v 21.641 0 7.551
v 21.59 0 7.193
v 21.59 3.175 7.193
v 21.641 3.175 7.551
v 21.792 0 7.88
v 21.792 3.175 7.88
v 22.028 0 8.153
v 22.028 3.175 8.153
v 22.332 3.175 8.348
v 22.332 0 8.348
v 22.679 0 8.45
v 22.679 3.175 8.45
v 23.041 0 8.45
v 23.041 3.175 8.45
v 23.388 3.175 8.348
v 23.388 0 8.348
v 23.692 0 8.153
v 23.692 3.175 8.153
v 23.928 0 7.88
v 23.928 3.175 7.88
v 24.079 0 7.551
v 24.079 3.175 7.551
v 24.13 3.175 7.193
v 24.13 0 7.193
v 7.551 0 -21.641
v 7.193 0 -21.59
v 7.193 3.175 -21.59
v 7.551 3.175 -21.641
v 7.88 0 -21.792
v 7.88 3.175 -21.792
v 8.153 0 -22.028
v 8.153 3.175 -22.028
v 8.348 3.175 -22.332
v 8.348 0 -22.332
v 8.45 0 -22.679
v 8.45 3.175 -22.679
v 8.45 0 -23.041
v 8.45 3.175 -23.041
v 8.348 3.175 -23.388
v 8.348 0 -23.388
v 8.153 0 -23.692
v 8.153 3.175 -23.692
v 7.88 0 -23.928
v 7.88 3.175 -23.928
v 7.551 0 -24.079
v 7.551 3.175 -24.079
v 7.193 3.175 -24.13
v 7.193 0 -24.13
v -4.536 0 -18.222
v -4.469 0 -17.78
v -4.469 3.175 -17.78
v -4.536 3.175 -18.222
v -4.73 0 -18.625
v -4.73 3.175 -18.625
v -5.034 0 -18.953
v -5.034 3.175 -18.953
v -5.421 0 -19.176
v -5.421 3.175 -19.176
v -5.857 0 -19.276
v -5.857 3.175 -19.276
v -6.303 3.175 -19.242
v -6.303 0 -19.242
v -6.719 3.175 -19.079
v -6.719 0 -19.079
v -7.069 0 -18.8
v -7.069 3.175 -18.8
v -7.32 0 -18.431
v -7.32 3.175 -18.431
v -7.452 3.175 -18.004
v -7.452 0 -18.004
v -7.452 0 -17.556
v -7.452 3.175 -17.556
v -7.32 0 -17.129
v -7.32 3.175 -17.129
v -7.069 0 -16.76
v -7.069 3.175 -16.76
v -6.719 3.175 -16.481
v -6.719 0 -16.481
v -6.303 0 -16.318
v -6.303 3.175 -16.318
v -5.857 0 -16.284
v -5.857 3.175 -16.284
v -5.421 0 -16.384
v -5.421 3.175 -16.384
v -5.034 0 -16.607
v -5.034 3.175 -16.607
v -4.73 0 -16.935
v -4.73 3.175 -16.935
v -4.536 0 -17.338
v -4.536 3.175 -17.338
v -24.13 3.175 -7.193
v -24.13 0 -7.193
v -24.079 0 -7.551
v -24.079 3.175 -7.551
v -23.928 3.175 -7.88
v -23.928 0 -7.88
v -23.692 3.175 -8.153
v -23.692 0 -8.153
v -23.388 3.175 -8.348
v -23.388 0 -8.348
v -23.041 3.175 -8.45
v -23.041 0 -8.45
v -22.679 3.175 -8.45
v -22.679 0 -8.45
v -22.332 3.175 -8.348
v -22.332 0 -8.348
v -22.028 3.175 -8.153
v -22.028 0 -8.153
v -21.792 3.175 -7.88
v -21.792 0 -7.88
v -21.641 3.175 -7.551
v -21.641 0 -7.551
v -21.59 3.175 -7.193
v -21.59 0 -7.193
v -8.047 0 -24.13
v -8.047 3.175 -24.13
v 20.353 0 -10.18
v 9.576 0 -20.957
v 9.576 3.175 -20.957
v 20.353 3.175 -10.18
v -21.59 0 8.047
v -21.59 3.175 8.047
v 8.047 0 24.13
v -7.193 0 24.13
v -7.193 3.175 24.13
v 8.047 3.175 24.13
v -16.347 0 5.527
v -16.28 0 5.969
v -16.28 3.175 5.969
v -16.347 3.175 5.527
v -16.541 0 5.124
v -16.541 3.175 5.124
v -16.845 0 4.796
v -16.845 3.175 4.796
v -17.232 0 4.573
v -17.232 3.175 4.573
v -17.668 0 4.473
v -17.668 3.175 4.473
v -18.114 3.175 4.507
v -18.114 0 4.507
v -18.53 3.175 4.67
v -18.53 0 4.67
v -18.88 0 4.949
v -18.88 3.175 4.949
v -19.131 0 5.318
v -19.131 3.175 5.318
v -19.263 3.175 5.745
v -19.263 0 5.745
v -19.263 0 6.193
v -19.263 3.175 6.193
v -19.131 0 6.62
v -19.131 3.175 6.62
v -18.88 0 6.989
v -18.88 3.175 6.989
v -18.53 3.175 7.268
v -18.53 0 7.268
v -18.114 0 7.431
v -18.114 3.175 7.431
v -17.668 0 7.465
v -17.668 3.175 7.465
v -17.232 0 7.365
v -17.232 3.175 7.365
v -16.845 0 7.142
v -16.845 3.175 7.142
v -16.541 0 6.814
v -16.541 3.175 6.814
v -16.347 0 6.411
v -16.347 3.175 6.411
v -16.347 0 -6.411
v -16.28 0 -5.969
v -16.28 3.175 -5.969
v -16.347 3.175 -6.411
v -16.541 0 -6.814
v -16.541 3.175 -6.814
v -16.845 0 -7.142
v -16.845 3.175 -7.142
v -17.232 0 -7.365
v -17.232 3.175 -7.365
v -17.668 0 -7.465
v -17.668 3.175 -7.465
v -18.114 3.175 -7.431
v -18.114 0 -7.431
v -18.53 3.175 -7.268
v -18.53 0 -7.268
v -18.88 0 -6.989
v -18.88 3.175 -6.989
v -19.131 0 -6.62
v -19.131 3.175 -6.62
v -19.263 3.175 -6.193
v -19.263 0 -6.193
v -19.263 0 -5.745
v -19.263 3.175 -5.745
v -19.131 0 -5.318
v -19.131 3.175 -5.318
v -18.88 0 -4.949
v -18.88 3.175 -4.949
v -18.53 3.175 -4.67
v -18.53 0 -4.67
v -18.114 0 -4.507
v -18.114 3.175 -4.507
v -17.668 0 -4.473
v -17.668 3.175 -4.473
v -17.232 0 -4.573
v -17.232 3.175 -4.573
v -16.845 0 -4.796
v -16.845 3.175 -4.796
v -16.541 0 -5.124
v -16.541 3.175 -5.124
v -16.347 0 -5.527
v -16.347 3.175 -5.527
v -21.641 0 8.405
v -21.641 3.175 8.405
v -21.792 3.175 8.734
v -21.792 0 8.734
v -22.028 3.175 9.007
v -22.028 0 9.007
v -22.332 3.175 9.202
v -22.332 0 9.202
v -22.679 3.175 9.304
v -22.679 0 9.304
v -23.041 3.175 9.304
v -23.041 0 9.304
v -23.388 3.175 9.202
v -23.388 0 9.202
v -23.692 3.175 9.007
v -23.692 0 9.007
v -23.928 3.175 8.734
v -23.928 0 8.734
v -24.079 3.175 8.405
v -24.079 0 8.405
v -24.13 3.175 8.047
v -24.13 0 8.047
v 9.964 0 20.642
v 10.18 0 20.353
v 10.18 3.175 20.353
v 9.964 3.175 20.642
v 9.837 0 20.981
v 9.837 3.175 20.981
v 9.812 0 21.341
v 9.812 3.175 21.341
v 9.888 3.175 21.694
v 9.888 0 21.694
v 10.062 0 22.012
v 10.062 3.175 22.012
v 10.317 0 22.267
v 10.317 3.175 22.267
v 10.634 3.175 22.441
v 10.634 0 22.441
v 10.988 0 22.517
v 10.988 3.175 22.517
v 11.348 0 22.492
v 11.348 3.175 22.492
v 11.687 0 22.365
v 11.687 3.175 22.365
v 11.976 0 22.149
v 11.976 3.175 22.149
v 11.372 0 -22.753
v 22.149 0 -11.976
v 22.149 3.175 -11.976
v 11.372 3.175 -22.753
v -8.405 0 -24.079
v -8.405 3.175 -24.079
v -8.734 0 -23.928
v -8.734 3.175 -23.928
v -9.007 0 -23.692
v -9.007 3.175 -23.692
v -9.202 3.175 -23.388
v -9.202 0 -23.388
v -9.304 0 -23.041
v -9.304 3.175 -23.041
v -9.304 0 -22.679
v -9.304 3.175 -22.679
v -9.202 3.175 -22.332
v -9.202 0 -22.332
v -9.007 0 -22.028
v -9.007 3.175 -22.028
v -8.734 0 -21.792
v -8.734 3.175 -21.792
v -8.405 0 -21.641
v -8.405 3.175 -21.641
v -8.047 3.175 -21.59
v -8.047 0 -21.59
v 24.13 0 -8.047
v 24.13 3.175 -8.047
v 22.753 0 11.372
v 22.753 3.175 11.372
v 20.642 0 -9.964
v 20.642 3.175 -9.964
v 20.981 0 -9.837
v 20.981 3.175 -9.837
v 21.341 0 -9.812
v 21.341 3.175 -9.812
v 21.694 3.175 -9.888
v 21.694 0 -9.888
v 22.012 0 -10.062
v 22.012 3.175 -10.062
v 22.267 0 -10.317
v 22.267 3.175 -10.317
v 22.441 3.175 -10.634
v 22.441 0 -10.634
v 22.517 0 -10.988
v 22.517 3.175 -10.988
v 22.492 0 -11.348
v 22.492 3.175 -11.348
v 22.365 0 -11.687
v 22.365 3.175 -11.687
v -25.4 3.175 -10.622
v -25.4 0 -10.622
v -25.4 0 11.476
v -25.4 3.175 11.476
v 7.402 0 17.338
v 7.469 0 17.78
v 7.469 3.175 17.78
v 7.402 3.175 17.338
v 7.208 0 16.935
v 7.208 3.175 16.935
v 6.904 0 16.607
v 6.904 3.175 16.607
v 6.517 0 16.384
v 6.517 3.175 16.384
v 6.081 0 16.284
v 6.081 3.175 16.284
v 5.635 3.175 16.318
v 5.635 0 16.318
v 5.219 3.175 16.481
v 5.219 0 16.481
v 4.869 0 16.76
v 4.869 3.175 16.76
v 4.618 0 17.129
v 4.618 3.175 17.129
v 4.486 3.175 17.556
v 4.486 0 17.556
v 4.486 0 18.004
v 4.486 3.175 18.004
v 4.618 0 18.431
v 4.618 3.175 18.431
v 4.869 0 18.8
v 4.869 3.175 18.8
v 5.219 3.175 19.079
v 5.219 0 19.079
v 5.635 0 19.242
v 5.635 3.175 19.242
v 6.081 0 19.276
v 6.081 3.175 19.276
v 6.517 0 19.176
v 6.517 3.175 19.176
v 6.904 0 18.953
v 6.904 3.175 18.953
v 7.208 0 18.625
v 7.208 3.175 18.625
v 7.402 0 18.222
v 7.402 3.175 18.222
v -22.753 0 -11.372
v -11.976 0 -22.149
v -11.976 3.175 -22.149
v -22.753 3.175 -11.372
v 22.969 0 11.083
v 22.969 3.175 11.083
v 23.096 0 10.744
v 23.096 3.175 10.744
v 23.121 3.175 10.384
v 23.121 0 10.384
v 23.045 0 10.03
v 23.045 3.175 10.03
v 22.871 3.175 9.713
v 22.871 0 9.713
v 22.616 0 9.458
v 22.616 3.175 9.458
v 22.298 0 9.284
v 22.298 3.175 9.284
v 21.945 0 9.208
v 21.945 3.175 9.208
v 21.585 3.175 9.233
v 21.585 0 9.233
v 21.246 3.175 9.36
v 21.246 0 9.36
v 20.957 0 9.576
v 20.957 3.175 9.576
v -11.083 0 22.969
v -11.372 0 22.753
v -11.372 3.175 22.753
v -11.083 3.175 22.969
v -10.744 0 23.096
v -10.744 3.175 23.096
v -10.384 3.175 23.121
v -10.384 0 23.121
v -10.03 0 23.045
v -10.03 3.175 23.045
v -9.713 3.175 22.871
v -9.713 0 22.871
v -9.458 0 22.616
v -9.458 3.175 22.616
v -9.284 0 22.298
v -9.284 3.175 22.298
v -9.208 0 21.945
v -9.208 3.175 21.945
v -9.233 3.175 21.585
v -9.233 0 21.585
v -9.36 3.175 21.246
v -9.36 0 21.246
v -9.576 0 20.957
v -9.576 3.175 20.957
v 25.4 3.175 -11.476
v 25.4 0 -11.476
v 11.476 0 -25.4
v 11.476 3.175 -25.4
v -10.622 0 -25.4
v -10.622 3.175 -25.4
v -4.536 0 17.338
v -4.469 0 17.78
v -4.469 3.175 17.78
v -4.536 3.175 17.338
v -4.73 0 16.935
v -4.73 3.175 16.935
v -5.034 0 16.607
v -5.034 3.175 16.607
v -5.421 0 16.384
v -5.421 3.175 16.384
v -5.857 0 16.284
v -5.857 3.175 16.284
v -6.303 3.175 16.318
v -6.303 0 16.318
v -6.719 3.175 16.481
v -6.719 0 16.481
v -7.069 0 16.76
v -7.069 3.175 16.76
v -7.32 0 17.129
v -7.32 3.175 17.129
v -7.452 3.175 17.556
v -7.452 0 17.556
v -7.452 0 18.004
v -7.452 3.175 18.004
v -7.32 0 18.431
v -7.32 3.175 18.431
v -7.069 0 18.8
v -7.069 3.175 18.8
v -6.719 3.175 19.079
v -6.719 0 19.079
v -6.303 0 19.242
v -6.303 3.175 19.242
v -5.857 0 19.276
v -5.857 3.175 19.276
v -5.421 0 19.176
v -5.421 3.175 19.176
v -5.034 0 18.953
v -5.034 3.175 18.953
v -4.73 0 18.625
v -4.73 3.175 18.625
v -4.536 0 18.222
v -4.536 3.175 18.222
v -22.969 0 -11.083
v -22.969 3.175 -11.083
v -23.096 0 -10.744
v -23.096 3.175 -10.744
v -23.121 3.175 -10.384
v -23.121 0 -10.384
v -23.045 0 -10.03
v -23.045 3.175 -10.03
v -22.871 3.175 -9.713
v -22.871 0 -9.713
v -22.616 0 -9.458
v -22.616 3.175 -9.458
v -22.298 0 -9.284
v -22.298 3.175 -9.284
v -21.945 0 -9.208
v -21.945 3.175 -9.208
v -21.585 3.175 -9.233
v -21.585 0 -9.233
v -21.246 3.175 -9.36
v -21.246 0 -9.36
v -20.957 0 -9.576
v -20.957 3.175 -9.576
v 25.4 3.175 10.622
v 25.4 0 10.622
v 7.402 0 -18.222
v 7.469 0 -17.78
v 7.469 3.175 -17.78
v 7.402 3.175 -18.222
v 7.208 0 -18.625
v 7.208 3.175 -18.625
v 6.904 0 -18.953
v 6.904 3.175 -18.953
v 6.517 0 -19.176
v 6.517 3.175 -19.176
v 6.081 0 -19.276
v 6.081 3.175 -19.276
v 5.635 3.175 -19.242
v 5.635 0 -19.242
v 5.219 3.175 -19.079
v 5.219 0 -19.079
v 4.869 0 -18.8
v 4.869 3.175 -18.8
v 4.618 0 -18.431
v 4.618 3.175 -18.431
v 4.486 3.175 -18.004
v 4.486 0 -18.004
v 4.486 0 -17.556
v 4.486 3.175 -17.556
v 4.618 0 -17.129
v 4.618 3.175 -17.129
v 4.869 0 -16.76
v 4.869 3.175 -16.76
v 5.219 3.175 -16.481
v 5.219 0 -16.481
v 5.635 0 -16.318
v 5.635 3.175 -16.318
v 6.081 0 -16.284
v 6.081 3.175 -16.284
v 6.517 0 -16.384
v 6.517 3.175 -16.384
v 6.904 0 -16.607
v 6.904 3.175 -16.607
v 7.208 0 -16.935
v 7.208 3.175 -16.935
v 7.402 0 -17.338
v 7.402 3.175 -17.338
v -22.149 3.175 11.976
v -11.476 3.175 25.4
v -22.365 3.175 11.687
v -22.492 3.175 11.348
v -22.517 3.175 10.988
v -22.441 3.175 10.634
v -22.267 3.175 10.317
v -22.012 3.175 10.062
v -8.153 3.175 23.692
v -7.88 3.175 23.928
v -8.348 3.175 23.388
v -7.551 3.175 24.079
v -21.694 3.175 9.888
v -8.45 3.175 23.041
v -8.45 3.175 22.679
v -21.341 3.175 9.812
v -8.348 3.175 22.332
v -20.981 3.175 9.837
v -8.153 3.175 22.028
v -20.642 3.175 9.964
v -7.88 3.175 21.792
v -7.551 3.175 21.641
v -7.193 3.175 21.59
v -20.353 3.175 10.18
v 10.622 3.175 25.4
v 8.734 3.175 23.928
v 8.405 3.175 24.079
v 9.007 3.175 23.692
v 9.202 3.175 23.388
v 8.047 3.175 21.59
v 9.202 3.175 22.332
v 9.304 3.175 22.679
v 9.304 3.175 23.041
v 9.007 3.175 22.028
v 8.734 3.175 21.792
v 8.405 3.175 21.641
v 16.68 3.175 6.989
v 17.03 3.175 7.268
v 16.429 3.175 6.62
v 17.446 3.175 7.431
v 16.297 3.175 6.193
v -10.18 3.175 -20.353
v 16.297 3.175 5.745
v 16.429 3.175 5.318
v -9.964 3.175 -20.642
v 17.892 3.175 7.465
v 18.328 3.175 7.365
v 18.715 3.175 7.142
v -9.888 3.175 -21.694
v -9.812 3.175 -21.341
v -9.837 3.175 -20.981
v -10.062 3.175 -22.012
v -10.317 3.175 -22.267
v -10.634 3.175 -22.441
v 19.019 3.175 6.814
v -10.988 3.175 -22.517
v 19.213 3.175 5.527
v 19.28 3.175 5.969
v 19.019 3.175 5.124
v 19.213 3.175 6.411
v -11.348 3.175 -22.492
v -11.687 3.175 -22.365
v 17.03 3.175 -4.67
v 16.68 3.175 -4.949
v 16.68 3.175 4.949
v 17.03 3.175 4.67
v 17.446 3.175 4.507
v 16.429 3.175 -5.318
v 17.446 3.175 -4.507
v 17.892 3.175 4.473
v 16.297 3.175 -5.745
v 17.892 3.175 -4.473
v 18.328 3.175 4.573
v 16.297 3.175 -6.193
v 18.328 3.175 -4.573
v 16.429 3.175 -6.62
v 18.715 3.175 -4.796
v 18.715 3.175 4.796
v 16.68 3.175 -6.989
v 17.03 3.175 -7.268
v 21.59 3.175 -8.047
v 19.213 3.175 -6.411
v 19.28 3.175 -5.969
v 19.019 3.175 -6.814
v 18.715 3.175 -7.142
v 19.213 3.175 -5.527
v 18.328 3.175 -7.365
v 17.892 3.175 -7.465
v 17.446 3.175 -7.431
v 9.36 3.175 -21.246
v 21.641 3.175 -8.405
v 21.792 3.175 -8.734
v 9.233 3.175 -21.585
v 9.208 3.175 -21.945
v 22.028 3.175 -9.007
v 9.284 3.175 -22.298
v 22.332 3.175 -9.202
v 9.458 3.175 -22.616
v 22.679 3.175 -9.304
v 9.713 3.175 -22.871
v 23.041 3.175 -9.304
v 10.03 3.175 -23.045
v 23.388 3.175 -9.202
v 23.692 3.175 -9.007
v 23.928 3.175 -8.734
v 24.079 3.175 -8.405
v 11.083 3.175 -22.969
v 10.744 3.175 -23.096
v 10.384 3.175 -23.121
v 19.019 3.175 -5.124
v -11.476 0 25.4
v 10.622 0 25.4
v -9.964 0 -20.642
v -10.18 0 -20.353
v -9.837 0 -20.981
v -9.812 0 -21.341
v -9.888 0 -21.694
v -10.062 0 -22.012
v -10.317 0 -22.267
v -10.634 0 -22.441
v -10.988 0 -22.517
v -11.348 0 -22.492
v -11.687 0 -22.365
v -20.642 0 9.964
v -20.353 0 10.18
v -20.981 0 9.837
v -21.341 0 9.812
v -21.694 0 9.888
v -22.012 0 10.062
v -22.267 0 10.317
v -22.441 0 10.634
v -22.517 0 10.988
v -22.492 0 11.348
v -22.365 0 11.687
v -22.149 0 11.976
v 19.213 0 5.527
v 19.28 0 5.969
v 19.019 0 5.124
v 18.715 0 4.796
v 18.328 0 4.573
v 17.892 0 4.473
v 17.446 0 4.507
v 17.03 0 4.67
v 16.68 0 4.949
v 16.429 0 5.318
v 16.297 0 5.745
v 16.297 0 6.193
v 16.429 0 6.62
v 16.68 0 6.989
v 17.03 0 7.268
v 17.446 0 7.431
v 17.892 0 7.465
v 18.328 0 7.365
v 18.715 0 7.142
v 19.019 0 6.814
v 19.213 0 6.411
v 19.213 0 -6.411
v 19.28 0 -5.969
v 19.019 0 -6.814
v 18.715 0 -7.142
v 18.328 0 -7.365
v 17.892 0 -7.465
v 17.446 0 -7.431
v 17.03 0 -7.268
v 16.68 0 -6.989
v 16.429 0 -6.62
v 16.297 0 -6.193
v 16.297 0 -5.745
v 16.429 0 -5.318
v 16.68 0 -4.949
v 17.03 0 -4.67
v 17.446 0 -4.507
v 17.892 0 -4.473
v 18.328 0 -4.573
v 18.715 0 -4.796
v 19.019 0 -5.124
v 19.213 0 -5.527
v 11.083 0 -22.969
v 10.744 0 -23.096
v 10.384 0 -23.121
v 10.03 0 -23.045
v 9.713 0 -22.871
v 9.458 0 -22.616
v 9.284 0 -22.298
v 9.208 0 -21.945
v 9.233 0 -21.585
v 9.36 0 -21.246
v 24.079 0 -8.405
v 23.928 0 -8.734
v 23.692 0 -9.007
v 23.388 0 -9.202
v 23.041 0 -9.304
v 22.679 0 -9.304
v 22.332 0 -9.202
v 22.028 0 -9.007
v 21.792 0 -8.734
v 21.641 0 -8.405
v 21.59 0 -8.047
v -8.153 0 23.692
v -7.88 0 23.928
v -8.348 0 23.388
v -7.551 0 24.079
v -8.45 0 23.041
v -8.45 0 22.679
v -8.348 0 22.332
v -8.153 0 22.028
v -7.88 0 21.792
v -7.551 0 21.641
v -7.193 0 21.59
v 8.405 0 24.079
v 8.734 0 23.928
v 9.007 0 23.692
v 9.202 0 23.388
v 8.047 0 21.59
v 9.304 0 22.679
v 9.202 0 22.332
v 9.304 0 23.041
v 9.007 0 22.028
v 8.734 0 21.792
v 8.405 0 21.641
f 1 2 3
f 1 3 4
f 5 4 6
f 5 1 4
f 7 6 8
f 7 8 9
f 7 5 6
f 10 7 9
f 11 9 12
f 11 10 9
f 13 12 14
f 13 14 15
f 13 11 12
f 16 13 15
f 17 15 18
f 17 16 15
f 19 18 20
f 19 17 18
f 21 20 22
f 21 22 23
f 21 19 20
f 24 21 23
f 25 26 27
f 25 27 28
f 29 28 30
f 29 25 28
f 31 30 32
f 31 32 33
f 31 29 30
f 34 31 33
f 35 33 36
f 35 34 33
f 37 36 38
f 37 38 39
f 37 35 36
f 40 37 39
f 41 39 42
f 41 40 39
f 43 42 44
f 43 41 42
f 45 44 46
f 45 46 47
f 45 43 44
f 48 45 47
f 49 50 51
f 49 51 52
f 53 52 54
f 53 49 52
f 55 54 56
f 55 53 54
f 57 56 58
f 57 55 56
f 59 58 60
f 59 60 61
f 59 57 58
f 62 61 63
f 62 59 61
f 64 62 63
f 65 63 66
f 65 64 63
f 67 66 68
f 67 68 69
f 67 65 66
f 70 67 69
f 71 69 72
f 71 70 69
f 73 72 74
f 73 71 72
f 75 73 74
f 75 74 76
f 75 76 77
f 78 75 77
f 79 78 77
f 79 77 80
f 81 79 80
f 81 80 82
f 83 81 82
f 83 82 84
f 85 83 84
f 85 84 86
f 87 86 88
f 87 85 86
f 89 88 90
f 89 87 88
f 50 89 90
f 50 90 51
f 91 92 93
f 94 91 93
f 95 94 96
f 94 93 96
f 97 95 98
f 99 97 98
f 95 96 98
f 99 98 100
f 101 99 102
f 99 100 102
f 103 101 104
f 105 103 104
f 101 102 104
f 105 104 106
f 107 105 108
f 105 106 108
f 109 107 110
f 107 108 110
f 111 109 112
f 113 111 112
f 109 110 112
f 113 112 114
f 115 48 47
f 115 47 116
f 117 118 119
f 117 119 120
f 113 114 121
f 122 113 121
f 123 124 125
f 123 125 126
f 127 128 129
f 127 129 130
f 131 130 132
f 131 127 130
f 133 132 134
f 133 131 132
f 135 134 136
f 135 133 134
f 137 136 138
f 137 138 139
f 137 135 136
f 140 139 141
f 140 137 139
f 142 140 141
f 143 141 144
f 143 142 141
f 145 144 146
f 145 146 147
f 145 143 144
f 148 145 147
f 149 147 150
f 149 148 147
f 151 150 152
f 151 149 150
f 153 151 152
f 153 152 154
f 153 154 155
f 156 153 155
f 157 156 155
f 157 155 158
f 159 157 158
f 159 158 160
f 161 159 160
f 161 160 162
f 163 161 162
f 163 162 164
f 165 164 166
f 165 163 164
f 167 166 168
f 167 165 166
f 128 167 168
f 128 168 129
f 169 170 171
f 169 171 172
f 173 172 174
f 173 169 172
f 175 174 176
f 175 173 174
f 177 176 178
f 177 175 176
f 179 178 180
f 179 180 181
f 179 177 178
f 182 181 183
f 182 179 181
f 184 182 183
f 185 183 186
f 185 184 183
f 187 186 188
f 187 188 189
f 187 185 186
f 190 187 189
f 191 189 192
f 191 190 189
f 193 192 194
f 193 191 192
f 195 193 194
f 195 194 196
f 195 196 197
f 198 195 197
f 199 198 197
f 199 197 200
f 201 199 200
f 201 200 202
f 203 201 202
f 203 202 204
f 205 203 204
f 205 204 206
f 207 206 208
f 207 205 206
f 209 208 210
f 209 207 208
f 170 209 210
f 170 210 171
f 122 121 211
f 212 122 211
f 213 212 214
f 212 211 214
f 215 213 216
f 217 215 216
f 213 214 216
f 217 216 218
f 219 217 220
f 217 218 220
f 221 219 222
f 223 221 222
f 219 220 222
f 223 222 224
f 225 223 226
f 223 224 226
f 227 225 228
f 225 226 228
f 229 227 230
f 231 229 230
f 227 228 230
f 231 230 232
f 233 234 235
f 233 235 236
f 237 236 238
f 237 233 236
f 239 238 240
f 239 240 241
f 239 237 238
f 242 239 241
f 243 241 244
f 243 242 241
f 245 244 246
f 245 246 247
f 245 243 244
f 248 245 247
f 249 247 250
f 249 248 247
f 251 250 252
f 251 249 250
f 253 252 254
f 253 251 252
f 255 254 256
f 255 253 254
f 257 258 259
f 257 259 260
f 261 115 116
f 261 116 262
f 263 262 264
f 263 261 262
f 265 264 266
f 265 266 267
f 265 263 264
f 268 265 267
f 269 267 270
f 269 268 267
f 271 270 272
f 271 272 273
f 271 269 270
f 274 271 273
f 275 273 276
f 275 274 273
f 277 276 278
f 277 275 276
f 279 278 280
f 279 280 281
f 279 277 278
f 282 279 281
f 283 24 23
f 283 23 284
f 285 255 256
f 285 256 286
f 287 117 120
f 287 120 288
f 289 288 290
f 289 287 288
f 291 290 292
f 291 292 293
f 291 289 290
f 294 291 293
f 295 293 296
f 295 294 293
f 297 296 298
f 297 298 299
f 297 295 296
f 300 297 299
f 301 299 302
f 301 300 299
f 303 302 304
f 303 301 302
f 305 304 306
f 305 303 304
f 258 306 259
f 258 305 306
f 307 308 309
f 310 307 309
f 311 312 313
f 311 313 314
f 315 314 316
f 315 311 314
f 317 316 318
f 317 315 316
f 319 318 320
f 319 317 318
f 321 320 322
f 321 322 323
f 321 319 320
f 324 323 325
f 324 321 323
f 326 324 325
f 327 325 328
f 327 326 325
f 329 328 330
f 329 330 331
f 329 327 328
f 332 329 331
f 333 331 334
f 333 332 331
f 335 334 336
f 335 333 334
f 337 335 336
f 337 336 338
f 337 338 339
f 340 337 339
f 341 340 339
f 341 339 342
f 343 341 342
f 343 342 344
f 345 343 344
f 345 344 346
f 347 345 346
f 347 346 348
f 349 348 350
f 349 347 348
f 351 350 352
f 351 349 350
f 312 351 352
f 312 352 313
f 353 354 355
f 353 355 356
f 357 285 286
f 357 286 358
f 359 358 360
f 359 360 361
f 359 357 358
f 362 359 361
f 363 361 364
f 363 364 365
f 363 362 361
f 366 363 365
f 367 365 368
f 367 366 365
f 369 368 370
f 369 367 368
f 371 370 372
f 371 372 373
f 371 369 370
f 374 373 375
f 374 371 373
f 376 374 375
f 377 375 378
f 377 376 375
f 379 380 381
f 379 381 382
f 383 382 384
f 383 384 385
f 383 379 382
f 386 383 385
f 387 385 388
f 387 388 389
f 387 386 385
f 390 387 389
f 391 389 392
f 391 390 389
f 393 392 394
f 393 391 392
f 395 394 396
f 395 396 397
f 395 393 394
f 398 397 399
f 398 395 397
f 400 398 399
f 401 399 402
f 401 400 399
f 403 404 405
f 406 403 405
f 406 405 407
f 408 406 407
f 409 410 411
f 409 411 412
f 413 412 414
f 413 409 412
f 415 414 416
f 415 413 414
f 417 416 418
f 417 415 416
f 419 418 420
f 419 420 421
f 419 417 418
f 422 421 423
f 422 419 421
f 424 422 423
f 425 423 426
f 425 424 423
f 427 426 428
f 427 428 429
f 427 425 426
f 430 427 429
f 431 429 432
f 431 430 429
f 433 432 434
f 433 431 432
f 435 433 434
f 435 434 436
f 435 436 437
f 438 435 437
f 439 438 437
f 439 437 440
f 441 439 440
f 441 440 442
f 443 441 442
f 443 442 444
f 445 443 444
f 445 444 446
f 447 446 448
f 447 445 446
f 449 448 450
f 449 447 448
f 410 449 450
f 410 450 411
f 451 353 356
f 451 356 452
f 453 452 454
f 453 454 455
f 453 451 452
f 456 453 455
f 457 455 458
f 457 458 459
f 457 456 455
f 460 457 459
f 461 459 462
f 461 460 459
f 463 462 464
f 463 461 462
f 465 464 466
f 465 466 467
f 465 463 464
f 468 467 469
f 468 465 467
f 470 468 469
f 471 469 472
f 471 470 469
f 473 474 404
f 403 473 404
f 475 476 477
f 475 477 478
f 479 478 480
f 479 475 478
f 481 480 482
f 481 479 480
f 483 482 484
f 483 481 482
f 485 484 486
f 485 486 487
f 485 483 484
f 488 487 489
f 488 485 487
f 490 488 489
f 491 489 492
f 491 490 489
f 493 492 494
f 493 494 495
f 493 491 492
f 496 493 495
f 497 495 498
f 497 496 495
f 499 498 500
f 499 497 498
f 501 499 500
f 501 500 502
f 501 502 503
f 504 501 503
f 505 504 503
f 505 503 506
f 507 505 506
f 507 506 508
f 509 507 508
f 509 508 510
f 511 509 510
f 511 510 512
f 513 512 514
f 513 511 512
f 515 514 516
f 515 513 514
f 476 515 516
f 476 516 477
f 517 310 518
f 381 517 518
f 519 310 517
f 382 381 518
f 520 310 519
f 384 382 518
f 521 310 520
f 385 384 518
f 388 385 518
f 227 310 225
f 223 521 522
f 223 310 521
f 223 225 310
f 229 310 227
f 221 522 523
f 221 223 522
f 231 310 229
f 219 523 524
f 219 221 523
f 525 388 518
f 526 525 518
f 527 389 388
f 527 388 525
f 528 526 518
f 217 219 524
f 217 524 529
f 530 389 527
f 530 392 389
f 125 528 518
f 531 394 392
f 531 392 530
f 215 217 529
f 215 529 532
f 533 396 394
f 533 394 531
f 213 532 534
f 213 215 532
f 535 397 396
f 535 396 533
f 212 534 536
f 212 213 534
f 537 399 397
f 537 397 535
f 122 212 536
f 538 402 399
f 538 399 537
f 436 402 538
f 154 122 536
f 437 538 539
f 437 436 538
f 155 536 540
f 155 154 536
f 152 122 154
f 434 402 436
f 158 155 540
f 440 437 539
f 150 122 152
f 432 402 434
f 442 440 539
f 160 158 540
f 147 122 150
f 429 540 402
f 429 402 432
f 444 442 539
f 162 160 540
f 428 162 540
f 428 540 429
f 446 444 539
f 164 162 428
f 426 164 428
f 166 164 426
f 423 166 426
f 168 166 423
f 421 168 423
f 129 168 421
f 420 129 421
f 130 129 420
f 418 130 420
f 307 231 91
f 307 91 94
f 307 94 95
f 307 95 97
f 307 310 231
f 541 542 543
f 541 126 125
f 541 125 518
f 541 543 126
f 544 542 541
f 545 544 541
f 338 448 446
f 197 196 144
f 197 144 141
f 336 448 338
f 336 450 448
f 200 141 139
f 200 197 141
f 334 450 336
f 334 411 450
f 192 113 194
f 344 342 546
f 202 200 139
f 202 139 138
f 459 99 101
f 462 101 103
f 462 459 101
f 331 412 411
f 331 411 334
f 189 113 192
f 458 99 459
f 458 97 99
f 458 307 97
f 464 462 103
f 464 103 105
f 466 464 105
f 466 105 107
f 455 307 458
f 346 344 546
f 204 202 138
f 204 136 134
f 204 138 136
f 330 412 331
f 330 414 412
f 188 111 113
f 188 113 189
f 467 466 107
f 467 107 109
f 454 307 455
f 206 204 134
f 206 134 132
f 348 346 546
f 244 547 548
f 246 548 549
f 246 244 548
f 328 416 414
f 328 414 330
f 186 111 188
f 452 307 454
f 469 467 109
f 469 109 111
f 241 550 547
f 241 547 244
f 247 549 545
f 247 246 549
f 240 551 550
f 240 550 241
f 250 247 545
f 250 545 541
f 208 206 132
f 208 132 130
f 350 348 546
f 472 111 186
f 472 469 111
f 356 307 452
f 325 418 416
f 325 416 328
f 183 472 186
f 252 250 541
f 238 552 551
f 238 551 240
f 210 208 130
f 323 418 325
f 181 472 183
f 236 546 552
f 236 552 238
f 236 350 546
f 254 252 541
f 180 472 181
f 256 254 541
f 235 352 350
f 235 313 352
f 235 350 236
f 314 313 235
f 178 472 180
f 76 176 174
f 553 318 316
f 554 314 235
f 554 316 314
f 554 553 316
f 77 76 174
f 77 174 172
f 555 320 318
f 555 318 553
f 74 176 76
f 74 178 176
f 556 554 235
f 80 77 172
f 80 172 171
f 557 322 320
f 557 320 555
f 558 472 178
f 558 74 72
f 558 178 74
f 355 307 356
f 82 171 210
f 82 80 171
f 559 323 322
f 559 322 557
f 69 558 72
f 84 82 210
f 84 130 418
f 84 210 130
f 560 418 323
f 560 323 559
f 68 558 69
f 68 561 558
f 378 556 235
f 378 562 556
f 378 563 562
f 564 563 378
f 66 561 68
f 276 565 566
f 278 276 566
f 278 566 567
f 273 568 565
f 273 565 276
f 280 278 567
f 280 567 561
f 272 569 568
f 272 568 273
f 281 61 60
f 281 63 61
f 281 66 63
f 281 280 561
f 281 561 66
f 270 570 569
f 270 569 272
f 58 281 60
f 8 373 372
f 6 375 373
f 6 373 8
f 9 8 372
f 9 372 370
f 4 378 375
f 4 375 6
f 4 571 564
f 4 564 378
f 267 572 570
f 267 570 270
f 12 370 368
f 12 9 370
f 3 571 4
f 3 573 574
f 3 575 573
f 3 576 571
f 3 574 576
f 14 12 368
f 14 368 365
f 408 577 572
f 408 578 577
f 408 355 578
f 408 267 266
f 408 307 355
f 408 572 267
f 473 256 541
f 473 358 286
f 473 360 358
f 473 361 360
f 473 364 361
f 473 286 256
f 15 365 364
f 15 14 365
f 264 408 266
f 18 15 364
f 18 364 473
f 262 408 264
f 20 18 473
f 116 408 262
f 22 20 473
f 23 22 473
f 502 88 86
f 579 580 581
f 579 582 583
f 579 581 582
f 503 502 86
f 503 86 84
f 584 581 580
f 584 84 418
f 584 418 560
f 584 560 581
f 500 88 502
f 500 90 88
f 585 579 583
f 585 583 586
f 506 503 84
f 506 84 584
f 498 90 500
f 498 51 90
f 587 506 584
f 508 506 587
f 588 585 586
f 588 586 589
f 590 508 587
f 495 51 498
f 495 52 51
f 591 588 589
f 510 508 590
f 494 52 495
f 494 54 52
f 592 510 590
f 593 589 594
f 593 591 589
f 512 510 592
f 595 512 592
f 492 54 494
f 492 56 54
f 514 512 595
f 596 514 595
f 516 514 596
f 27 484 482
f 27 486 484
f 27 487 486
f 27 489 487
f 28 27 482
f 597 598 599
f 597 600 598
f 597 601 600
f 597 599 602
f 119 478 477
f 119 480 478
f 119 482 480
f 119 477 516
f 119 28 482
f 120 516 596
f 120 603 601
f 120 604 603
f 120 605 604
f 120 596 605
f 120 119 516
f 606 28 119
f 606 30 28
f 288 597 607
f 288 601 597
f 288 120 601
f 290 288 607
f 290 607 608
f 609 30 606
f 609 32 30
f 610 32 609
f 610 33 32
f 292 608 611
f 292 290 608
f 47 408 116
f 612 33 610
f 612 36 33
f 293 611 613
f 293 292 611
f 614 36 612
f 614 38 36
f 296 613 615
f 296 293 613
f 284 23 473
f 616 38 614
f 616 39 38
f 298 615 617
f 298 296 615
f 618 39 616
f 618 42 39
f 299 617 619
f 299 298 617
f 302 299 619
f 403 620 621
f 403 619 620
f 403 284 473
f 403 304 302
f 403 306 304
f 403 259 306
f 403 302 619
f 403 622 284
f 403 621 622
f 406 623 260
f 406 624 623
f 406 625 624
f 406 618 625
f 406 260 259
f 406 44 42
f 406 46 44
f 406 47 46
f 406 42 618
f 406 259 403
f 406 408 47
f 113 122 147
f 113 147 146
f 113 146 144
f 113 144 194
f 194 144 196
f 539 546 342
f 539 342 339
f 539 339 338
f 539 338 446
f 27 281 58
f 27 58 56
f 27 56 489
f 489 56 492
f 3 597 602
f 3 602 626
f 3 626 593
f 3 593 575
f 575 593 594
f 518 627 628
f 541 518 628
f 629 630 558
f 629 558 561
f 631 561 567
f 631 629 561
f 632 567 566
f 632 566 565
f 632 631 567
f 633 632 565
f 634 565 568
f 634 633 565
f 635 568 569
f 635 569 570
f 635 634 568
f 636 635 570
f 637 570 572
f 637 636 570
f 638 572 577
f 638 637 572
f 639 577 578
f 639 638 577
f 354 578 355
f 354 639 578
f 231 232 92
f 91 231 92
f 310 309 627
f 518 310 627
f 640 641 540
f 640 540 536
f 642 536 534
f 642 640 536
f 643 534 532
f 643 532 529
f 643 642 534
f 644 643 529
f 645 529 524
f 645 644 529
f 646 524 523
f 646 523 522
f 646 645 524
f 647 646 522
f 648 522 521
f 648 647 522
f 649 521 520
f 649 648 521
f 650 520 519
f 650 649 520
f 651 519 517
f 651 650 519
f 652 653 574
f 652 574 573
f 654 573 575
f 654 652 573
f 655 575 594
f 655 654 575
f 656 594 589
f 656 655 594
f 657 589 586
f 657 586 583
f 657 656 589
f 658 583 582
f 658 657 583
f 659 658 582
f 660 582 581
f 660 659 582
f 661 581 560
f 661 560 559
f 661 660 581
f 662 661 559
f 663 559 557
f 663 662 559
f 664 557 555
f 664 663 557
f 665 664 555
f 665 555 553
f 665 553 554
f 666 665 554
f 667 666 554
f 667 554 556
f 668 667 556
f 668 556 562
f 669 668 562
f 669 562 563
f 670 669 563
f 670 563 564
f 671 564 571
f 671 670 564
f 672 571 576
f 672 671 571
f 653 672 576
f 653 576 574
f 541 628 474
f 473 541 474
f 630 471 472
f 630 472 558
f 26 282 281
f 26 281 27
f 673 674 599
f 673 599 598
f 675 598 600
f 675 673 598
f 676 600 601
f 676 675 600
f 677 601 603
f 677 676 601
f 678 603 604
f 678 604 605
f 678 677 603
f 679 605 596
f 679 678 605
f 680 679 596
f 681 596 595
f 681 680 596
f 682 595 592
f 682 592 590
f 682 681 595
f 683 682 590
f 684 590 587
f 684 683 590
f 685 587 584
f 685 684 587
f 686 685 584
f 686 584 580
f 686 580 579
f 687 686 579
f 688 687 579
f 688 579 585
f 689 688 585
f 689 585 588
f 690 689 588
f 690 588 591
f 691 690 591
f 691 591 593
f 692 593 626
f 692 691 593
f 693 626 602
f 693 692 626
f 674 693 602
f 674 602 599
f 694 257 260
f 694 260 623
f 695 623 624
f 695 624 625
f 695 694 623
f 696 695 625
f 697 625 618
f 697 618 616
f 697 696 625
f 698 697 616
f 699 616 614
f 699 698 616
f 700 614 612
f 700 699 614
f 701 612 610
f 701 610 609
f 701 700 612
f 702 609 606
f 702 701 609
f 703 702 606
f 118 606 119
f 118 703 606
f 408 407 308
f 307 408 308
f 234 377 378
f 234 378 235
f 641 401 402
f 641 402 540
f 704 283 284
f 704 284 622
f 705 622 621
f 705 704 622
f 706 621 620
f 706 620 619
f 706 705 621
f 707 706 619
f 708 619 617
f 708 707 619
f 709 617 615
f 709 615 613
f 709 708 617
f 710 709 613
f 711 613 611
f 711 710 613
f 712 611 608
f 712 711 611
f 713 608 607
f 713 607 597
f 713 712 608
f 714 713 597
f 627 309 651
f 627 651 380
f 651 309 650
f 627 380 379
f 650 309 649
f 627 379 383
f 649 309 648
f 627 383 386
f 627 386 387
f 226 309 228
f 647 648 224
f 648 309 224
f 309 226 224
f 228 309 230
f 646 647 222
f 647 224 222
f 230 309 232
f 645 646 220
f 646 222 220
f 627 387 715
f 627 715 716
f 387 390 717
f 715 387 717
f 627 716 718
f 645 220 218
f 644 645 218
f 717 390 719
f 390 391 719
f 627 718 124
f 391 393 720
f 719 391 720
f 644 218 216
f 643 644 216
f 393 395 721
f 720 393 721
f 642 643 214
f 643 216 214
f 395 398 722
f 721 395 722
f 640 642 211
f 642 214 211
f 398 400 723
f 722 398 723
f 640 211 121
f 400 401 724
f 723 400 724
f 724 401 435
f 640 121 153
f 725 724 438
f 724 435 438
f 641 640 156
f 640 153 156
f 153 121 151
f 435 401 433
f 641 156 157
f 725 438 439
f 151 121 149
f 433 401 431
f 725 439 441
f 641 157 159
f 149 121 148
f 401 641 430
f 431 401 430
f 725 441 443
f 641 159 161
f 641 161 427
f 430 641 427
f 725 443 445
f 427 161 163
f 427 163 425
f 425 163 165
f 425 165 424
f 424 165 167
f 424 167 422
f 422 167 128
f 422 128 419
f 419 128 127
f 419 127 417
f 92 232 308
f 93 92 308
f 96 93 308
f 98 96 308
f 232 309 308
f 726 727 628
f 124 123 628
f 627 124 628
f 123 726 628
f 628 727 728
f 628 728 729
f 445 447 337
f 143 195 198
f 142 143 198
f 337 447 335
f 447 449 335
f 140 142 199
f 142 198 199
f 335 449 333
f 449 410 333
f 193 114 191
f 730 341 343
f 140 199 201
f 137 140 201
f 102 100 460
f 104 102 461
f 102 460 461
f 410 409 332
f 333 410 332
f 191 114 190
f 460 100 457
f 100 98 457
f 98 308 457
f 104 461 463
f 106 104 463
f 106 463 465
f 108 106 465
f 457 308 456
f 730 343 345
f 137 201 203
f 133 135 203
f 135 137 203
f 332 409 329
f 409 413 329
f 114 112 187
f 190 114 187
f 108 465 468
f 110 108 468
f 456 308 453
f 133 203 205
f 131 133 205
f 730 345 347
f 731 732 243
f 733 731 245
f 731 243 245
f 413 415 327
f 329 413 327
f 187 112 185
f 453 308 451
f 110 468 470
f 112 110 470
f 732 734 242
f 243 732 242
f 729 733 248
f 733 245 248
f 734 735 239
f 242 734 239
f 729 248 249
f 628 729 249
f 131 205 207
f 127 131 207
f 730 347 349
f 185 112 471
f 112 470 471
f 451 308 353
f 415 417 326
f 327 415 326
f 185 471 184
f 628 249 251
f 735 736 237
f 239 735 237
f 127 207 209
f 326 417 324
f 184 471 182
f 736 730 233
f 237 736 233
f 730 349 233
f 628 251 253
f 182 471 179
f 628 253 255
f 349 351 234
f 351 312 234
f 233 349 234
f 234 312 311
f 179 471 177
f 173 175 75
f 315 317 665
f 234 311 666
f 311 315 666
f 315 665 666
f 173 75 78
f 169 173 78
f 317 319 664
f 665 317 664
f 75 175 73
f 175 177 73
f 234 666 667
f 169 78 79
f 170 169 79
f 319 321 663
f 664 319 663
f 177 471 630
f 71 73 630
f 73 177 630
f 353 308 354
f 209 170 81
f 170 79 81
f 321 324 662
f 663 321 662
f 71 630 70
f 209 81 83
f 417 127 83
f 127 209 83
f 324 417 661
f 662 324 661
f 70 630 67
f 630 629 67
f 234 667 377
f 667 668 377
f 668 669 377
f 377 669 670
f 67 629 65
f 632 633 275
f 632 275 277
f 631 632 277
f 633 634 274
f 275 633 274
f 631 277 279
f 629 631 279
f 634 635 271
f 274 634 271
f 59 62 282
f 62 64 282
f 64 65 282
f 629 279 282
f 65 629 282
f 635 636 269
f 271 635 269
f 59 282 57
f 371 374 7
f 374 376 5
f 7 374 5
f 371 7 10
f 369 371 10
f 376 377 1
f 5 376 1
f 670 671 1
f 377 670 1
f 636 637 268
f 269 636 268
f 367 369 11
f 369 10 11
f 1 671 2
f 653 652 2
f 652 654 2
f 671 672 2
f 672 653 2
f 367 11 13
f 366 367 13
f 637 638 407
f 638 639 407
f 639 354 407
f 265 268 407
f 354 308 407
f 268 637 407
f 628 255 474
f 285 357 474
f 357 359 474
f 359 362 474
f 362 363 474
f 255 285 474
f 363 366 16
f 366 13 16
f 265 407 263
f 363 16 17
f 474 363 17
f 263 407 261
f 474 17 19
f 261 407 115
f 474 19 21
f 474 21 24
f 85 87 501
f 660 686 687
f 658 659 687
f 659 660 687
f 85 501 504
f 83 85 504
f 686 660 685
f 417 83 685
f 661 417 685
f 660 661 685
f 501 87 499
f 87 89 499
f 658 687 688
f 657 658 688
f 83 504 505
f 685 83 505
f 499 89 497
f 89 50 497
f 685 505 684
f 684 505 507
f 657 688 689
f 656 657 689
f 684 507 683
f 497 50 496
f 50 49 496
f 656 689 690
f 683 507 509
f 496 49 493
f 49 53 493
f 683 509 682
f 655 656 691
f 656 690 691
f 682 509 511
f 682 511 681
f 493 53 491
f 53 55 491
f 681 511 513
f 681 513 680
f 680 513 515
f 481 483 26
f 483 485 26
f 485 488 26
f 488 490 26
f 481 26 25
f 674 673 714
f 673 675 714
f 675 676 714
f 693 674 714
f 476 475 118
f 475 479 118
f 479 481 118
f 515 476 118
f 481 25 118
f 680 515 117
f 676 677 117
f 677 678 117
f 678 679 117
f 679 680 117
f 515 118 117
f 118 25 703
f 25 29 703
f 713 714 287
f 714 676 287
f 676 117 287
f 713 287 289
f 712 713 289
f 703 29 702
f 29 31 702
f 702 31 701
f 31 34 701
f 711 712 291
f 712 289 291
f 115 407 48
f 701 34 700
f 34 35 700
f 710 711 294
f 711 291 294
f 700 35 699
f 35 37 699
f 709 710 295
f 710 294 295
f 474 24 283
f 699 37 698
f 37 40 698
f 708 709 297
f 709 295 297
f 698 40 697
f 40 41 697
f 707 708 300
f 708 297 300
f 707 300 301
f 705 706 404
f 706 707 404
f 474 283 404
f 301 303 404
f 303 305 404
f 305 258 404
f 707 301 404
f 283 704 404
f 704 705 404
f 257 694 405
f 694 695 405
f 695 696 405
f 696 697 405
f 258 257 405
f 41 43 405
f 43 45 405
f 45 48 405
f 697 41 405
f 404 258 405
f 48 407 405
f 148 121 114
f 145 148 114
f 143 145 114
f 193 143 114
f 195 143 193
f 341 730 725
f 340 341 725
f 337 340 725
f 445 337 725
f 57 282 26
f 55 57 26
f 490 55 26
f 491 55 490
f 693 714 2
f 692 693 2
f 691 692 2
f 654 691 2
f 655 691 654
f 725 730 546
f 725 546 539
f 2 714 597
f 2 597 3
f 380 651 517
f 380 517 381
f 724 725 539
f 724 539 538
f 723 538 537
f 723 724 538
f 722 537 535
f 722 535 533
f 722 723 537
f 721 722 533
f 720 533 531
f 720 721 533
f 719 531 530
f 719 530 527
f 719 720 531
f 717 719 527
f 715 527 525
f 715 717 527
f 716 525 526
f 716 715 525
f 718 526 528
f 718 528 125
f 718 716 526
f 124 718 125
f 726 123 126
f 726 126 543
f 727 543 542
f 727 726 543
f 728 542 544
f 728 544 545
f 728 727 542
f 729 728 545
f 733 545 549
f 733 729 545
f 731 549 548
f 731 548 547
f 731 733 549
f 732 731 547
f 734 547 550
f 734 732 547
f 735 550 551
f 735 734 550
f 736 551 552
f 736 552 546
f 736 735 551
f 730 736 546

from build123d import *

# Parameters (mm, degrees)
SKETCH1_R           = 1.5
BOSS_EXTRUDE1_DEPTH = 3.175


with BuildPart() as part:
    # Sketch1 → Boss-Extrude1 (new body)
    with BuildSketch(Plane(origin=(0, 0, 0), x_dir=(1, 0, 0), z_dir=(0, 1, 0))):
        Polygon((-25.4, 10.621890813), (-25.4, -11.476109187), (-11.476109187, -25.4), (10.621890813, -25.4), (25.4, -10.621890813), (25.4, 11.476109187), (11.476109187, 25.4), (-10.621890813, 25.4), align=None)
        with Locations((-17.78, 5.969)):
            Circle(SKETCH1_R, mode=Mode.SUBTRACT)
        with Locations((-17.78, -5.969)):
            Circle(SKETCH1_R, mode=Mode.SUBTRACT)
        with Locations((-5.969, 17.78)):
            Circle(SKETCH1_R, mode=Mode.SUBTRACT)
        with Locations((5.969, 17.78)):
            Circle(SKETCH1_R, mode=Mode.SUBTRACT)
        with Locations((17.78, 5.969)):
            Circle(SKETCH1_R, mode=Mode.SUBTRACT)
        with Locations((17.78, -5.969)):
            Circle(SKETCH1_R, mode=Mode.SUBTRACT)
        with Locations((5.969, -17.78)):
            Circle(SKETCH1_R, mode=Mode.SUBTRACT)
        with Locations((-5.969, -17.78)):
            Circle(SKETCH1_R, mode=Mode.SUBTRACT)
        with BuildLine():
            Line((-24.13, -8.047109187), (-24.13, 7.192890813))
            ThreePointArc((-24.13, 7.192890813), (-22.86, 8.462890813), (-21.59, 7.192890813))
            Line((-21.59, 7.192890813), (-21.59, -8.047109187))
            ThreePointArc((-21.59, -8.047109187), (-22.86, -9.317109187), (-24.13, -8.047109187))
        make_face(mode=Mode.SUBTRACT)
        with BuildLine():
            Line((-20.956600881, 9.576269931), (-10.180293536, 20.352577276))
            ThreePointArc((-10.180293536, 20.352577276), (-10.180293536, 22.1486285), (-11.97634476, 22.1486285))
            Line((-11.97634476, 22.1486285), (-22.752652105, 11.372321155))
            ThreePointArc((-22.752652105, 11.372321155), (-22.752652105, 9.576269931), (-20.956600881, 9.576269931))
        make_face(mode=Mode.SUBTRACT)
        with BuildLine():
            Line((-8.047109187, 21.59), (7.192890813, 21.59))
            ThreePointArc((7.192890813, 21.59), (8.462890813, 22.86), (7.192890813, 24.13))
            Line((7.192890813, 24.13), (-8.047109187, 24.13))
            ThreePointArc((-8.047109187, 24.13), (-9.317109187, 22.86), (-8.047109187, 21.59))
        make_face(mode=Mode.SUBTRACT)
        with BuildLine():
            Line((9.576269931, 20.956600881), (20.352577276, 10.180293536))
            ThreePointArc((20.352577276, 10.180293536), (22.1486285, 10.180293536), (22.1486285, 11.97634476))
            Line((22.1486285, 11.97634476), (11.372321155, 22.752652105))
            ThreePointArc((11.372321155, 22.752652105), (9.576269931, 22.752652105), (9.576269931, 20.956600881))
        make_face(mode=Mode.SUBTRACT)
        with BuildLine():
            Line((21.59, 8.047109187), (21.59, -7.192890813))
            ThreePointArc((21.59, -7.192890813), (22.86, -8.462890813), (24.13, -7.192890813))
            Line((24.13, -7.192890813), (24.13, 8.047109187))
            ThreePointArc((24.13, 8.047109187), (22.86, 9.317109187), (21.59, 8.047109187))
        make_face(mode=Mode.SUBTRACT)
        with BuildLine():
            Line((20.956600881, -9.576269931), (10.180293536, -20.352577276))
            ThreePointArc((10.180293536, -20.352577276), (10.180293536, -22.1486285), (11.97634476, -22.1486285))
            Line((11.97634476, -22.1486285), (22.752652105, -11.372321155))
            ThreePointArc((22.752652105, -11.372321155), (22.752652105, -9.576269931), (20.956600881, -9.576269931))
        make_face(mode=Mode.SUBTRACT)
        with BuildLine():
            Line((8.047109187, -21.59), (-7.192890813, -21.59))
            ThreePointArc((-7.192890813, -21.59), (-8.462890813, -22.86), (-7.192890813, -24.13))
            Line((-7.192890813, -24.13), (8.047109187, -24.13))
            ThreePointArc((8.047109187, -24.13), (9.317109187, -22.86), (8.047109187, -21.59))
        make_face(mode=Mode.SUBTRACT)
        with BuildLine():
            Line((-9.576269931, -20.956600881), (-20.352577276, -10.180293536))
            ThreePointArc((-20.352577276, -10.180293536), (-22.1486285, -10.180293536), (-22.1486285, -11.97634476))
            Line((-22.1486285, -11.97634476), (-11.372321155, -22.752652105))
            ThreePointArc((-11.372321155, -22.752652105), (-9.576269931, -22.752652105), (-9.576269931, -20.956600881))
        make_face(mode=Mode.SUBTRACT)
    extrude(amount=BOSS_EXTRUDE1_DEPTH)


solid = part.part
